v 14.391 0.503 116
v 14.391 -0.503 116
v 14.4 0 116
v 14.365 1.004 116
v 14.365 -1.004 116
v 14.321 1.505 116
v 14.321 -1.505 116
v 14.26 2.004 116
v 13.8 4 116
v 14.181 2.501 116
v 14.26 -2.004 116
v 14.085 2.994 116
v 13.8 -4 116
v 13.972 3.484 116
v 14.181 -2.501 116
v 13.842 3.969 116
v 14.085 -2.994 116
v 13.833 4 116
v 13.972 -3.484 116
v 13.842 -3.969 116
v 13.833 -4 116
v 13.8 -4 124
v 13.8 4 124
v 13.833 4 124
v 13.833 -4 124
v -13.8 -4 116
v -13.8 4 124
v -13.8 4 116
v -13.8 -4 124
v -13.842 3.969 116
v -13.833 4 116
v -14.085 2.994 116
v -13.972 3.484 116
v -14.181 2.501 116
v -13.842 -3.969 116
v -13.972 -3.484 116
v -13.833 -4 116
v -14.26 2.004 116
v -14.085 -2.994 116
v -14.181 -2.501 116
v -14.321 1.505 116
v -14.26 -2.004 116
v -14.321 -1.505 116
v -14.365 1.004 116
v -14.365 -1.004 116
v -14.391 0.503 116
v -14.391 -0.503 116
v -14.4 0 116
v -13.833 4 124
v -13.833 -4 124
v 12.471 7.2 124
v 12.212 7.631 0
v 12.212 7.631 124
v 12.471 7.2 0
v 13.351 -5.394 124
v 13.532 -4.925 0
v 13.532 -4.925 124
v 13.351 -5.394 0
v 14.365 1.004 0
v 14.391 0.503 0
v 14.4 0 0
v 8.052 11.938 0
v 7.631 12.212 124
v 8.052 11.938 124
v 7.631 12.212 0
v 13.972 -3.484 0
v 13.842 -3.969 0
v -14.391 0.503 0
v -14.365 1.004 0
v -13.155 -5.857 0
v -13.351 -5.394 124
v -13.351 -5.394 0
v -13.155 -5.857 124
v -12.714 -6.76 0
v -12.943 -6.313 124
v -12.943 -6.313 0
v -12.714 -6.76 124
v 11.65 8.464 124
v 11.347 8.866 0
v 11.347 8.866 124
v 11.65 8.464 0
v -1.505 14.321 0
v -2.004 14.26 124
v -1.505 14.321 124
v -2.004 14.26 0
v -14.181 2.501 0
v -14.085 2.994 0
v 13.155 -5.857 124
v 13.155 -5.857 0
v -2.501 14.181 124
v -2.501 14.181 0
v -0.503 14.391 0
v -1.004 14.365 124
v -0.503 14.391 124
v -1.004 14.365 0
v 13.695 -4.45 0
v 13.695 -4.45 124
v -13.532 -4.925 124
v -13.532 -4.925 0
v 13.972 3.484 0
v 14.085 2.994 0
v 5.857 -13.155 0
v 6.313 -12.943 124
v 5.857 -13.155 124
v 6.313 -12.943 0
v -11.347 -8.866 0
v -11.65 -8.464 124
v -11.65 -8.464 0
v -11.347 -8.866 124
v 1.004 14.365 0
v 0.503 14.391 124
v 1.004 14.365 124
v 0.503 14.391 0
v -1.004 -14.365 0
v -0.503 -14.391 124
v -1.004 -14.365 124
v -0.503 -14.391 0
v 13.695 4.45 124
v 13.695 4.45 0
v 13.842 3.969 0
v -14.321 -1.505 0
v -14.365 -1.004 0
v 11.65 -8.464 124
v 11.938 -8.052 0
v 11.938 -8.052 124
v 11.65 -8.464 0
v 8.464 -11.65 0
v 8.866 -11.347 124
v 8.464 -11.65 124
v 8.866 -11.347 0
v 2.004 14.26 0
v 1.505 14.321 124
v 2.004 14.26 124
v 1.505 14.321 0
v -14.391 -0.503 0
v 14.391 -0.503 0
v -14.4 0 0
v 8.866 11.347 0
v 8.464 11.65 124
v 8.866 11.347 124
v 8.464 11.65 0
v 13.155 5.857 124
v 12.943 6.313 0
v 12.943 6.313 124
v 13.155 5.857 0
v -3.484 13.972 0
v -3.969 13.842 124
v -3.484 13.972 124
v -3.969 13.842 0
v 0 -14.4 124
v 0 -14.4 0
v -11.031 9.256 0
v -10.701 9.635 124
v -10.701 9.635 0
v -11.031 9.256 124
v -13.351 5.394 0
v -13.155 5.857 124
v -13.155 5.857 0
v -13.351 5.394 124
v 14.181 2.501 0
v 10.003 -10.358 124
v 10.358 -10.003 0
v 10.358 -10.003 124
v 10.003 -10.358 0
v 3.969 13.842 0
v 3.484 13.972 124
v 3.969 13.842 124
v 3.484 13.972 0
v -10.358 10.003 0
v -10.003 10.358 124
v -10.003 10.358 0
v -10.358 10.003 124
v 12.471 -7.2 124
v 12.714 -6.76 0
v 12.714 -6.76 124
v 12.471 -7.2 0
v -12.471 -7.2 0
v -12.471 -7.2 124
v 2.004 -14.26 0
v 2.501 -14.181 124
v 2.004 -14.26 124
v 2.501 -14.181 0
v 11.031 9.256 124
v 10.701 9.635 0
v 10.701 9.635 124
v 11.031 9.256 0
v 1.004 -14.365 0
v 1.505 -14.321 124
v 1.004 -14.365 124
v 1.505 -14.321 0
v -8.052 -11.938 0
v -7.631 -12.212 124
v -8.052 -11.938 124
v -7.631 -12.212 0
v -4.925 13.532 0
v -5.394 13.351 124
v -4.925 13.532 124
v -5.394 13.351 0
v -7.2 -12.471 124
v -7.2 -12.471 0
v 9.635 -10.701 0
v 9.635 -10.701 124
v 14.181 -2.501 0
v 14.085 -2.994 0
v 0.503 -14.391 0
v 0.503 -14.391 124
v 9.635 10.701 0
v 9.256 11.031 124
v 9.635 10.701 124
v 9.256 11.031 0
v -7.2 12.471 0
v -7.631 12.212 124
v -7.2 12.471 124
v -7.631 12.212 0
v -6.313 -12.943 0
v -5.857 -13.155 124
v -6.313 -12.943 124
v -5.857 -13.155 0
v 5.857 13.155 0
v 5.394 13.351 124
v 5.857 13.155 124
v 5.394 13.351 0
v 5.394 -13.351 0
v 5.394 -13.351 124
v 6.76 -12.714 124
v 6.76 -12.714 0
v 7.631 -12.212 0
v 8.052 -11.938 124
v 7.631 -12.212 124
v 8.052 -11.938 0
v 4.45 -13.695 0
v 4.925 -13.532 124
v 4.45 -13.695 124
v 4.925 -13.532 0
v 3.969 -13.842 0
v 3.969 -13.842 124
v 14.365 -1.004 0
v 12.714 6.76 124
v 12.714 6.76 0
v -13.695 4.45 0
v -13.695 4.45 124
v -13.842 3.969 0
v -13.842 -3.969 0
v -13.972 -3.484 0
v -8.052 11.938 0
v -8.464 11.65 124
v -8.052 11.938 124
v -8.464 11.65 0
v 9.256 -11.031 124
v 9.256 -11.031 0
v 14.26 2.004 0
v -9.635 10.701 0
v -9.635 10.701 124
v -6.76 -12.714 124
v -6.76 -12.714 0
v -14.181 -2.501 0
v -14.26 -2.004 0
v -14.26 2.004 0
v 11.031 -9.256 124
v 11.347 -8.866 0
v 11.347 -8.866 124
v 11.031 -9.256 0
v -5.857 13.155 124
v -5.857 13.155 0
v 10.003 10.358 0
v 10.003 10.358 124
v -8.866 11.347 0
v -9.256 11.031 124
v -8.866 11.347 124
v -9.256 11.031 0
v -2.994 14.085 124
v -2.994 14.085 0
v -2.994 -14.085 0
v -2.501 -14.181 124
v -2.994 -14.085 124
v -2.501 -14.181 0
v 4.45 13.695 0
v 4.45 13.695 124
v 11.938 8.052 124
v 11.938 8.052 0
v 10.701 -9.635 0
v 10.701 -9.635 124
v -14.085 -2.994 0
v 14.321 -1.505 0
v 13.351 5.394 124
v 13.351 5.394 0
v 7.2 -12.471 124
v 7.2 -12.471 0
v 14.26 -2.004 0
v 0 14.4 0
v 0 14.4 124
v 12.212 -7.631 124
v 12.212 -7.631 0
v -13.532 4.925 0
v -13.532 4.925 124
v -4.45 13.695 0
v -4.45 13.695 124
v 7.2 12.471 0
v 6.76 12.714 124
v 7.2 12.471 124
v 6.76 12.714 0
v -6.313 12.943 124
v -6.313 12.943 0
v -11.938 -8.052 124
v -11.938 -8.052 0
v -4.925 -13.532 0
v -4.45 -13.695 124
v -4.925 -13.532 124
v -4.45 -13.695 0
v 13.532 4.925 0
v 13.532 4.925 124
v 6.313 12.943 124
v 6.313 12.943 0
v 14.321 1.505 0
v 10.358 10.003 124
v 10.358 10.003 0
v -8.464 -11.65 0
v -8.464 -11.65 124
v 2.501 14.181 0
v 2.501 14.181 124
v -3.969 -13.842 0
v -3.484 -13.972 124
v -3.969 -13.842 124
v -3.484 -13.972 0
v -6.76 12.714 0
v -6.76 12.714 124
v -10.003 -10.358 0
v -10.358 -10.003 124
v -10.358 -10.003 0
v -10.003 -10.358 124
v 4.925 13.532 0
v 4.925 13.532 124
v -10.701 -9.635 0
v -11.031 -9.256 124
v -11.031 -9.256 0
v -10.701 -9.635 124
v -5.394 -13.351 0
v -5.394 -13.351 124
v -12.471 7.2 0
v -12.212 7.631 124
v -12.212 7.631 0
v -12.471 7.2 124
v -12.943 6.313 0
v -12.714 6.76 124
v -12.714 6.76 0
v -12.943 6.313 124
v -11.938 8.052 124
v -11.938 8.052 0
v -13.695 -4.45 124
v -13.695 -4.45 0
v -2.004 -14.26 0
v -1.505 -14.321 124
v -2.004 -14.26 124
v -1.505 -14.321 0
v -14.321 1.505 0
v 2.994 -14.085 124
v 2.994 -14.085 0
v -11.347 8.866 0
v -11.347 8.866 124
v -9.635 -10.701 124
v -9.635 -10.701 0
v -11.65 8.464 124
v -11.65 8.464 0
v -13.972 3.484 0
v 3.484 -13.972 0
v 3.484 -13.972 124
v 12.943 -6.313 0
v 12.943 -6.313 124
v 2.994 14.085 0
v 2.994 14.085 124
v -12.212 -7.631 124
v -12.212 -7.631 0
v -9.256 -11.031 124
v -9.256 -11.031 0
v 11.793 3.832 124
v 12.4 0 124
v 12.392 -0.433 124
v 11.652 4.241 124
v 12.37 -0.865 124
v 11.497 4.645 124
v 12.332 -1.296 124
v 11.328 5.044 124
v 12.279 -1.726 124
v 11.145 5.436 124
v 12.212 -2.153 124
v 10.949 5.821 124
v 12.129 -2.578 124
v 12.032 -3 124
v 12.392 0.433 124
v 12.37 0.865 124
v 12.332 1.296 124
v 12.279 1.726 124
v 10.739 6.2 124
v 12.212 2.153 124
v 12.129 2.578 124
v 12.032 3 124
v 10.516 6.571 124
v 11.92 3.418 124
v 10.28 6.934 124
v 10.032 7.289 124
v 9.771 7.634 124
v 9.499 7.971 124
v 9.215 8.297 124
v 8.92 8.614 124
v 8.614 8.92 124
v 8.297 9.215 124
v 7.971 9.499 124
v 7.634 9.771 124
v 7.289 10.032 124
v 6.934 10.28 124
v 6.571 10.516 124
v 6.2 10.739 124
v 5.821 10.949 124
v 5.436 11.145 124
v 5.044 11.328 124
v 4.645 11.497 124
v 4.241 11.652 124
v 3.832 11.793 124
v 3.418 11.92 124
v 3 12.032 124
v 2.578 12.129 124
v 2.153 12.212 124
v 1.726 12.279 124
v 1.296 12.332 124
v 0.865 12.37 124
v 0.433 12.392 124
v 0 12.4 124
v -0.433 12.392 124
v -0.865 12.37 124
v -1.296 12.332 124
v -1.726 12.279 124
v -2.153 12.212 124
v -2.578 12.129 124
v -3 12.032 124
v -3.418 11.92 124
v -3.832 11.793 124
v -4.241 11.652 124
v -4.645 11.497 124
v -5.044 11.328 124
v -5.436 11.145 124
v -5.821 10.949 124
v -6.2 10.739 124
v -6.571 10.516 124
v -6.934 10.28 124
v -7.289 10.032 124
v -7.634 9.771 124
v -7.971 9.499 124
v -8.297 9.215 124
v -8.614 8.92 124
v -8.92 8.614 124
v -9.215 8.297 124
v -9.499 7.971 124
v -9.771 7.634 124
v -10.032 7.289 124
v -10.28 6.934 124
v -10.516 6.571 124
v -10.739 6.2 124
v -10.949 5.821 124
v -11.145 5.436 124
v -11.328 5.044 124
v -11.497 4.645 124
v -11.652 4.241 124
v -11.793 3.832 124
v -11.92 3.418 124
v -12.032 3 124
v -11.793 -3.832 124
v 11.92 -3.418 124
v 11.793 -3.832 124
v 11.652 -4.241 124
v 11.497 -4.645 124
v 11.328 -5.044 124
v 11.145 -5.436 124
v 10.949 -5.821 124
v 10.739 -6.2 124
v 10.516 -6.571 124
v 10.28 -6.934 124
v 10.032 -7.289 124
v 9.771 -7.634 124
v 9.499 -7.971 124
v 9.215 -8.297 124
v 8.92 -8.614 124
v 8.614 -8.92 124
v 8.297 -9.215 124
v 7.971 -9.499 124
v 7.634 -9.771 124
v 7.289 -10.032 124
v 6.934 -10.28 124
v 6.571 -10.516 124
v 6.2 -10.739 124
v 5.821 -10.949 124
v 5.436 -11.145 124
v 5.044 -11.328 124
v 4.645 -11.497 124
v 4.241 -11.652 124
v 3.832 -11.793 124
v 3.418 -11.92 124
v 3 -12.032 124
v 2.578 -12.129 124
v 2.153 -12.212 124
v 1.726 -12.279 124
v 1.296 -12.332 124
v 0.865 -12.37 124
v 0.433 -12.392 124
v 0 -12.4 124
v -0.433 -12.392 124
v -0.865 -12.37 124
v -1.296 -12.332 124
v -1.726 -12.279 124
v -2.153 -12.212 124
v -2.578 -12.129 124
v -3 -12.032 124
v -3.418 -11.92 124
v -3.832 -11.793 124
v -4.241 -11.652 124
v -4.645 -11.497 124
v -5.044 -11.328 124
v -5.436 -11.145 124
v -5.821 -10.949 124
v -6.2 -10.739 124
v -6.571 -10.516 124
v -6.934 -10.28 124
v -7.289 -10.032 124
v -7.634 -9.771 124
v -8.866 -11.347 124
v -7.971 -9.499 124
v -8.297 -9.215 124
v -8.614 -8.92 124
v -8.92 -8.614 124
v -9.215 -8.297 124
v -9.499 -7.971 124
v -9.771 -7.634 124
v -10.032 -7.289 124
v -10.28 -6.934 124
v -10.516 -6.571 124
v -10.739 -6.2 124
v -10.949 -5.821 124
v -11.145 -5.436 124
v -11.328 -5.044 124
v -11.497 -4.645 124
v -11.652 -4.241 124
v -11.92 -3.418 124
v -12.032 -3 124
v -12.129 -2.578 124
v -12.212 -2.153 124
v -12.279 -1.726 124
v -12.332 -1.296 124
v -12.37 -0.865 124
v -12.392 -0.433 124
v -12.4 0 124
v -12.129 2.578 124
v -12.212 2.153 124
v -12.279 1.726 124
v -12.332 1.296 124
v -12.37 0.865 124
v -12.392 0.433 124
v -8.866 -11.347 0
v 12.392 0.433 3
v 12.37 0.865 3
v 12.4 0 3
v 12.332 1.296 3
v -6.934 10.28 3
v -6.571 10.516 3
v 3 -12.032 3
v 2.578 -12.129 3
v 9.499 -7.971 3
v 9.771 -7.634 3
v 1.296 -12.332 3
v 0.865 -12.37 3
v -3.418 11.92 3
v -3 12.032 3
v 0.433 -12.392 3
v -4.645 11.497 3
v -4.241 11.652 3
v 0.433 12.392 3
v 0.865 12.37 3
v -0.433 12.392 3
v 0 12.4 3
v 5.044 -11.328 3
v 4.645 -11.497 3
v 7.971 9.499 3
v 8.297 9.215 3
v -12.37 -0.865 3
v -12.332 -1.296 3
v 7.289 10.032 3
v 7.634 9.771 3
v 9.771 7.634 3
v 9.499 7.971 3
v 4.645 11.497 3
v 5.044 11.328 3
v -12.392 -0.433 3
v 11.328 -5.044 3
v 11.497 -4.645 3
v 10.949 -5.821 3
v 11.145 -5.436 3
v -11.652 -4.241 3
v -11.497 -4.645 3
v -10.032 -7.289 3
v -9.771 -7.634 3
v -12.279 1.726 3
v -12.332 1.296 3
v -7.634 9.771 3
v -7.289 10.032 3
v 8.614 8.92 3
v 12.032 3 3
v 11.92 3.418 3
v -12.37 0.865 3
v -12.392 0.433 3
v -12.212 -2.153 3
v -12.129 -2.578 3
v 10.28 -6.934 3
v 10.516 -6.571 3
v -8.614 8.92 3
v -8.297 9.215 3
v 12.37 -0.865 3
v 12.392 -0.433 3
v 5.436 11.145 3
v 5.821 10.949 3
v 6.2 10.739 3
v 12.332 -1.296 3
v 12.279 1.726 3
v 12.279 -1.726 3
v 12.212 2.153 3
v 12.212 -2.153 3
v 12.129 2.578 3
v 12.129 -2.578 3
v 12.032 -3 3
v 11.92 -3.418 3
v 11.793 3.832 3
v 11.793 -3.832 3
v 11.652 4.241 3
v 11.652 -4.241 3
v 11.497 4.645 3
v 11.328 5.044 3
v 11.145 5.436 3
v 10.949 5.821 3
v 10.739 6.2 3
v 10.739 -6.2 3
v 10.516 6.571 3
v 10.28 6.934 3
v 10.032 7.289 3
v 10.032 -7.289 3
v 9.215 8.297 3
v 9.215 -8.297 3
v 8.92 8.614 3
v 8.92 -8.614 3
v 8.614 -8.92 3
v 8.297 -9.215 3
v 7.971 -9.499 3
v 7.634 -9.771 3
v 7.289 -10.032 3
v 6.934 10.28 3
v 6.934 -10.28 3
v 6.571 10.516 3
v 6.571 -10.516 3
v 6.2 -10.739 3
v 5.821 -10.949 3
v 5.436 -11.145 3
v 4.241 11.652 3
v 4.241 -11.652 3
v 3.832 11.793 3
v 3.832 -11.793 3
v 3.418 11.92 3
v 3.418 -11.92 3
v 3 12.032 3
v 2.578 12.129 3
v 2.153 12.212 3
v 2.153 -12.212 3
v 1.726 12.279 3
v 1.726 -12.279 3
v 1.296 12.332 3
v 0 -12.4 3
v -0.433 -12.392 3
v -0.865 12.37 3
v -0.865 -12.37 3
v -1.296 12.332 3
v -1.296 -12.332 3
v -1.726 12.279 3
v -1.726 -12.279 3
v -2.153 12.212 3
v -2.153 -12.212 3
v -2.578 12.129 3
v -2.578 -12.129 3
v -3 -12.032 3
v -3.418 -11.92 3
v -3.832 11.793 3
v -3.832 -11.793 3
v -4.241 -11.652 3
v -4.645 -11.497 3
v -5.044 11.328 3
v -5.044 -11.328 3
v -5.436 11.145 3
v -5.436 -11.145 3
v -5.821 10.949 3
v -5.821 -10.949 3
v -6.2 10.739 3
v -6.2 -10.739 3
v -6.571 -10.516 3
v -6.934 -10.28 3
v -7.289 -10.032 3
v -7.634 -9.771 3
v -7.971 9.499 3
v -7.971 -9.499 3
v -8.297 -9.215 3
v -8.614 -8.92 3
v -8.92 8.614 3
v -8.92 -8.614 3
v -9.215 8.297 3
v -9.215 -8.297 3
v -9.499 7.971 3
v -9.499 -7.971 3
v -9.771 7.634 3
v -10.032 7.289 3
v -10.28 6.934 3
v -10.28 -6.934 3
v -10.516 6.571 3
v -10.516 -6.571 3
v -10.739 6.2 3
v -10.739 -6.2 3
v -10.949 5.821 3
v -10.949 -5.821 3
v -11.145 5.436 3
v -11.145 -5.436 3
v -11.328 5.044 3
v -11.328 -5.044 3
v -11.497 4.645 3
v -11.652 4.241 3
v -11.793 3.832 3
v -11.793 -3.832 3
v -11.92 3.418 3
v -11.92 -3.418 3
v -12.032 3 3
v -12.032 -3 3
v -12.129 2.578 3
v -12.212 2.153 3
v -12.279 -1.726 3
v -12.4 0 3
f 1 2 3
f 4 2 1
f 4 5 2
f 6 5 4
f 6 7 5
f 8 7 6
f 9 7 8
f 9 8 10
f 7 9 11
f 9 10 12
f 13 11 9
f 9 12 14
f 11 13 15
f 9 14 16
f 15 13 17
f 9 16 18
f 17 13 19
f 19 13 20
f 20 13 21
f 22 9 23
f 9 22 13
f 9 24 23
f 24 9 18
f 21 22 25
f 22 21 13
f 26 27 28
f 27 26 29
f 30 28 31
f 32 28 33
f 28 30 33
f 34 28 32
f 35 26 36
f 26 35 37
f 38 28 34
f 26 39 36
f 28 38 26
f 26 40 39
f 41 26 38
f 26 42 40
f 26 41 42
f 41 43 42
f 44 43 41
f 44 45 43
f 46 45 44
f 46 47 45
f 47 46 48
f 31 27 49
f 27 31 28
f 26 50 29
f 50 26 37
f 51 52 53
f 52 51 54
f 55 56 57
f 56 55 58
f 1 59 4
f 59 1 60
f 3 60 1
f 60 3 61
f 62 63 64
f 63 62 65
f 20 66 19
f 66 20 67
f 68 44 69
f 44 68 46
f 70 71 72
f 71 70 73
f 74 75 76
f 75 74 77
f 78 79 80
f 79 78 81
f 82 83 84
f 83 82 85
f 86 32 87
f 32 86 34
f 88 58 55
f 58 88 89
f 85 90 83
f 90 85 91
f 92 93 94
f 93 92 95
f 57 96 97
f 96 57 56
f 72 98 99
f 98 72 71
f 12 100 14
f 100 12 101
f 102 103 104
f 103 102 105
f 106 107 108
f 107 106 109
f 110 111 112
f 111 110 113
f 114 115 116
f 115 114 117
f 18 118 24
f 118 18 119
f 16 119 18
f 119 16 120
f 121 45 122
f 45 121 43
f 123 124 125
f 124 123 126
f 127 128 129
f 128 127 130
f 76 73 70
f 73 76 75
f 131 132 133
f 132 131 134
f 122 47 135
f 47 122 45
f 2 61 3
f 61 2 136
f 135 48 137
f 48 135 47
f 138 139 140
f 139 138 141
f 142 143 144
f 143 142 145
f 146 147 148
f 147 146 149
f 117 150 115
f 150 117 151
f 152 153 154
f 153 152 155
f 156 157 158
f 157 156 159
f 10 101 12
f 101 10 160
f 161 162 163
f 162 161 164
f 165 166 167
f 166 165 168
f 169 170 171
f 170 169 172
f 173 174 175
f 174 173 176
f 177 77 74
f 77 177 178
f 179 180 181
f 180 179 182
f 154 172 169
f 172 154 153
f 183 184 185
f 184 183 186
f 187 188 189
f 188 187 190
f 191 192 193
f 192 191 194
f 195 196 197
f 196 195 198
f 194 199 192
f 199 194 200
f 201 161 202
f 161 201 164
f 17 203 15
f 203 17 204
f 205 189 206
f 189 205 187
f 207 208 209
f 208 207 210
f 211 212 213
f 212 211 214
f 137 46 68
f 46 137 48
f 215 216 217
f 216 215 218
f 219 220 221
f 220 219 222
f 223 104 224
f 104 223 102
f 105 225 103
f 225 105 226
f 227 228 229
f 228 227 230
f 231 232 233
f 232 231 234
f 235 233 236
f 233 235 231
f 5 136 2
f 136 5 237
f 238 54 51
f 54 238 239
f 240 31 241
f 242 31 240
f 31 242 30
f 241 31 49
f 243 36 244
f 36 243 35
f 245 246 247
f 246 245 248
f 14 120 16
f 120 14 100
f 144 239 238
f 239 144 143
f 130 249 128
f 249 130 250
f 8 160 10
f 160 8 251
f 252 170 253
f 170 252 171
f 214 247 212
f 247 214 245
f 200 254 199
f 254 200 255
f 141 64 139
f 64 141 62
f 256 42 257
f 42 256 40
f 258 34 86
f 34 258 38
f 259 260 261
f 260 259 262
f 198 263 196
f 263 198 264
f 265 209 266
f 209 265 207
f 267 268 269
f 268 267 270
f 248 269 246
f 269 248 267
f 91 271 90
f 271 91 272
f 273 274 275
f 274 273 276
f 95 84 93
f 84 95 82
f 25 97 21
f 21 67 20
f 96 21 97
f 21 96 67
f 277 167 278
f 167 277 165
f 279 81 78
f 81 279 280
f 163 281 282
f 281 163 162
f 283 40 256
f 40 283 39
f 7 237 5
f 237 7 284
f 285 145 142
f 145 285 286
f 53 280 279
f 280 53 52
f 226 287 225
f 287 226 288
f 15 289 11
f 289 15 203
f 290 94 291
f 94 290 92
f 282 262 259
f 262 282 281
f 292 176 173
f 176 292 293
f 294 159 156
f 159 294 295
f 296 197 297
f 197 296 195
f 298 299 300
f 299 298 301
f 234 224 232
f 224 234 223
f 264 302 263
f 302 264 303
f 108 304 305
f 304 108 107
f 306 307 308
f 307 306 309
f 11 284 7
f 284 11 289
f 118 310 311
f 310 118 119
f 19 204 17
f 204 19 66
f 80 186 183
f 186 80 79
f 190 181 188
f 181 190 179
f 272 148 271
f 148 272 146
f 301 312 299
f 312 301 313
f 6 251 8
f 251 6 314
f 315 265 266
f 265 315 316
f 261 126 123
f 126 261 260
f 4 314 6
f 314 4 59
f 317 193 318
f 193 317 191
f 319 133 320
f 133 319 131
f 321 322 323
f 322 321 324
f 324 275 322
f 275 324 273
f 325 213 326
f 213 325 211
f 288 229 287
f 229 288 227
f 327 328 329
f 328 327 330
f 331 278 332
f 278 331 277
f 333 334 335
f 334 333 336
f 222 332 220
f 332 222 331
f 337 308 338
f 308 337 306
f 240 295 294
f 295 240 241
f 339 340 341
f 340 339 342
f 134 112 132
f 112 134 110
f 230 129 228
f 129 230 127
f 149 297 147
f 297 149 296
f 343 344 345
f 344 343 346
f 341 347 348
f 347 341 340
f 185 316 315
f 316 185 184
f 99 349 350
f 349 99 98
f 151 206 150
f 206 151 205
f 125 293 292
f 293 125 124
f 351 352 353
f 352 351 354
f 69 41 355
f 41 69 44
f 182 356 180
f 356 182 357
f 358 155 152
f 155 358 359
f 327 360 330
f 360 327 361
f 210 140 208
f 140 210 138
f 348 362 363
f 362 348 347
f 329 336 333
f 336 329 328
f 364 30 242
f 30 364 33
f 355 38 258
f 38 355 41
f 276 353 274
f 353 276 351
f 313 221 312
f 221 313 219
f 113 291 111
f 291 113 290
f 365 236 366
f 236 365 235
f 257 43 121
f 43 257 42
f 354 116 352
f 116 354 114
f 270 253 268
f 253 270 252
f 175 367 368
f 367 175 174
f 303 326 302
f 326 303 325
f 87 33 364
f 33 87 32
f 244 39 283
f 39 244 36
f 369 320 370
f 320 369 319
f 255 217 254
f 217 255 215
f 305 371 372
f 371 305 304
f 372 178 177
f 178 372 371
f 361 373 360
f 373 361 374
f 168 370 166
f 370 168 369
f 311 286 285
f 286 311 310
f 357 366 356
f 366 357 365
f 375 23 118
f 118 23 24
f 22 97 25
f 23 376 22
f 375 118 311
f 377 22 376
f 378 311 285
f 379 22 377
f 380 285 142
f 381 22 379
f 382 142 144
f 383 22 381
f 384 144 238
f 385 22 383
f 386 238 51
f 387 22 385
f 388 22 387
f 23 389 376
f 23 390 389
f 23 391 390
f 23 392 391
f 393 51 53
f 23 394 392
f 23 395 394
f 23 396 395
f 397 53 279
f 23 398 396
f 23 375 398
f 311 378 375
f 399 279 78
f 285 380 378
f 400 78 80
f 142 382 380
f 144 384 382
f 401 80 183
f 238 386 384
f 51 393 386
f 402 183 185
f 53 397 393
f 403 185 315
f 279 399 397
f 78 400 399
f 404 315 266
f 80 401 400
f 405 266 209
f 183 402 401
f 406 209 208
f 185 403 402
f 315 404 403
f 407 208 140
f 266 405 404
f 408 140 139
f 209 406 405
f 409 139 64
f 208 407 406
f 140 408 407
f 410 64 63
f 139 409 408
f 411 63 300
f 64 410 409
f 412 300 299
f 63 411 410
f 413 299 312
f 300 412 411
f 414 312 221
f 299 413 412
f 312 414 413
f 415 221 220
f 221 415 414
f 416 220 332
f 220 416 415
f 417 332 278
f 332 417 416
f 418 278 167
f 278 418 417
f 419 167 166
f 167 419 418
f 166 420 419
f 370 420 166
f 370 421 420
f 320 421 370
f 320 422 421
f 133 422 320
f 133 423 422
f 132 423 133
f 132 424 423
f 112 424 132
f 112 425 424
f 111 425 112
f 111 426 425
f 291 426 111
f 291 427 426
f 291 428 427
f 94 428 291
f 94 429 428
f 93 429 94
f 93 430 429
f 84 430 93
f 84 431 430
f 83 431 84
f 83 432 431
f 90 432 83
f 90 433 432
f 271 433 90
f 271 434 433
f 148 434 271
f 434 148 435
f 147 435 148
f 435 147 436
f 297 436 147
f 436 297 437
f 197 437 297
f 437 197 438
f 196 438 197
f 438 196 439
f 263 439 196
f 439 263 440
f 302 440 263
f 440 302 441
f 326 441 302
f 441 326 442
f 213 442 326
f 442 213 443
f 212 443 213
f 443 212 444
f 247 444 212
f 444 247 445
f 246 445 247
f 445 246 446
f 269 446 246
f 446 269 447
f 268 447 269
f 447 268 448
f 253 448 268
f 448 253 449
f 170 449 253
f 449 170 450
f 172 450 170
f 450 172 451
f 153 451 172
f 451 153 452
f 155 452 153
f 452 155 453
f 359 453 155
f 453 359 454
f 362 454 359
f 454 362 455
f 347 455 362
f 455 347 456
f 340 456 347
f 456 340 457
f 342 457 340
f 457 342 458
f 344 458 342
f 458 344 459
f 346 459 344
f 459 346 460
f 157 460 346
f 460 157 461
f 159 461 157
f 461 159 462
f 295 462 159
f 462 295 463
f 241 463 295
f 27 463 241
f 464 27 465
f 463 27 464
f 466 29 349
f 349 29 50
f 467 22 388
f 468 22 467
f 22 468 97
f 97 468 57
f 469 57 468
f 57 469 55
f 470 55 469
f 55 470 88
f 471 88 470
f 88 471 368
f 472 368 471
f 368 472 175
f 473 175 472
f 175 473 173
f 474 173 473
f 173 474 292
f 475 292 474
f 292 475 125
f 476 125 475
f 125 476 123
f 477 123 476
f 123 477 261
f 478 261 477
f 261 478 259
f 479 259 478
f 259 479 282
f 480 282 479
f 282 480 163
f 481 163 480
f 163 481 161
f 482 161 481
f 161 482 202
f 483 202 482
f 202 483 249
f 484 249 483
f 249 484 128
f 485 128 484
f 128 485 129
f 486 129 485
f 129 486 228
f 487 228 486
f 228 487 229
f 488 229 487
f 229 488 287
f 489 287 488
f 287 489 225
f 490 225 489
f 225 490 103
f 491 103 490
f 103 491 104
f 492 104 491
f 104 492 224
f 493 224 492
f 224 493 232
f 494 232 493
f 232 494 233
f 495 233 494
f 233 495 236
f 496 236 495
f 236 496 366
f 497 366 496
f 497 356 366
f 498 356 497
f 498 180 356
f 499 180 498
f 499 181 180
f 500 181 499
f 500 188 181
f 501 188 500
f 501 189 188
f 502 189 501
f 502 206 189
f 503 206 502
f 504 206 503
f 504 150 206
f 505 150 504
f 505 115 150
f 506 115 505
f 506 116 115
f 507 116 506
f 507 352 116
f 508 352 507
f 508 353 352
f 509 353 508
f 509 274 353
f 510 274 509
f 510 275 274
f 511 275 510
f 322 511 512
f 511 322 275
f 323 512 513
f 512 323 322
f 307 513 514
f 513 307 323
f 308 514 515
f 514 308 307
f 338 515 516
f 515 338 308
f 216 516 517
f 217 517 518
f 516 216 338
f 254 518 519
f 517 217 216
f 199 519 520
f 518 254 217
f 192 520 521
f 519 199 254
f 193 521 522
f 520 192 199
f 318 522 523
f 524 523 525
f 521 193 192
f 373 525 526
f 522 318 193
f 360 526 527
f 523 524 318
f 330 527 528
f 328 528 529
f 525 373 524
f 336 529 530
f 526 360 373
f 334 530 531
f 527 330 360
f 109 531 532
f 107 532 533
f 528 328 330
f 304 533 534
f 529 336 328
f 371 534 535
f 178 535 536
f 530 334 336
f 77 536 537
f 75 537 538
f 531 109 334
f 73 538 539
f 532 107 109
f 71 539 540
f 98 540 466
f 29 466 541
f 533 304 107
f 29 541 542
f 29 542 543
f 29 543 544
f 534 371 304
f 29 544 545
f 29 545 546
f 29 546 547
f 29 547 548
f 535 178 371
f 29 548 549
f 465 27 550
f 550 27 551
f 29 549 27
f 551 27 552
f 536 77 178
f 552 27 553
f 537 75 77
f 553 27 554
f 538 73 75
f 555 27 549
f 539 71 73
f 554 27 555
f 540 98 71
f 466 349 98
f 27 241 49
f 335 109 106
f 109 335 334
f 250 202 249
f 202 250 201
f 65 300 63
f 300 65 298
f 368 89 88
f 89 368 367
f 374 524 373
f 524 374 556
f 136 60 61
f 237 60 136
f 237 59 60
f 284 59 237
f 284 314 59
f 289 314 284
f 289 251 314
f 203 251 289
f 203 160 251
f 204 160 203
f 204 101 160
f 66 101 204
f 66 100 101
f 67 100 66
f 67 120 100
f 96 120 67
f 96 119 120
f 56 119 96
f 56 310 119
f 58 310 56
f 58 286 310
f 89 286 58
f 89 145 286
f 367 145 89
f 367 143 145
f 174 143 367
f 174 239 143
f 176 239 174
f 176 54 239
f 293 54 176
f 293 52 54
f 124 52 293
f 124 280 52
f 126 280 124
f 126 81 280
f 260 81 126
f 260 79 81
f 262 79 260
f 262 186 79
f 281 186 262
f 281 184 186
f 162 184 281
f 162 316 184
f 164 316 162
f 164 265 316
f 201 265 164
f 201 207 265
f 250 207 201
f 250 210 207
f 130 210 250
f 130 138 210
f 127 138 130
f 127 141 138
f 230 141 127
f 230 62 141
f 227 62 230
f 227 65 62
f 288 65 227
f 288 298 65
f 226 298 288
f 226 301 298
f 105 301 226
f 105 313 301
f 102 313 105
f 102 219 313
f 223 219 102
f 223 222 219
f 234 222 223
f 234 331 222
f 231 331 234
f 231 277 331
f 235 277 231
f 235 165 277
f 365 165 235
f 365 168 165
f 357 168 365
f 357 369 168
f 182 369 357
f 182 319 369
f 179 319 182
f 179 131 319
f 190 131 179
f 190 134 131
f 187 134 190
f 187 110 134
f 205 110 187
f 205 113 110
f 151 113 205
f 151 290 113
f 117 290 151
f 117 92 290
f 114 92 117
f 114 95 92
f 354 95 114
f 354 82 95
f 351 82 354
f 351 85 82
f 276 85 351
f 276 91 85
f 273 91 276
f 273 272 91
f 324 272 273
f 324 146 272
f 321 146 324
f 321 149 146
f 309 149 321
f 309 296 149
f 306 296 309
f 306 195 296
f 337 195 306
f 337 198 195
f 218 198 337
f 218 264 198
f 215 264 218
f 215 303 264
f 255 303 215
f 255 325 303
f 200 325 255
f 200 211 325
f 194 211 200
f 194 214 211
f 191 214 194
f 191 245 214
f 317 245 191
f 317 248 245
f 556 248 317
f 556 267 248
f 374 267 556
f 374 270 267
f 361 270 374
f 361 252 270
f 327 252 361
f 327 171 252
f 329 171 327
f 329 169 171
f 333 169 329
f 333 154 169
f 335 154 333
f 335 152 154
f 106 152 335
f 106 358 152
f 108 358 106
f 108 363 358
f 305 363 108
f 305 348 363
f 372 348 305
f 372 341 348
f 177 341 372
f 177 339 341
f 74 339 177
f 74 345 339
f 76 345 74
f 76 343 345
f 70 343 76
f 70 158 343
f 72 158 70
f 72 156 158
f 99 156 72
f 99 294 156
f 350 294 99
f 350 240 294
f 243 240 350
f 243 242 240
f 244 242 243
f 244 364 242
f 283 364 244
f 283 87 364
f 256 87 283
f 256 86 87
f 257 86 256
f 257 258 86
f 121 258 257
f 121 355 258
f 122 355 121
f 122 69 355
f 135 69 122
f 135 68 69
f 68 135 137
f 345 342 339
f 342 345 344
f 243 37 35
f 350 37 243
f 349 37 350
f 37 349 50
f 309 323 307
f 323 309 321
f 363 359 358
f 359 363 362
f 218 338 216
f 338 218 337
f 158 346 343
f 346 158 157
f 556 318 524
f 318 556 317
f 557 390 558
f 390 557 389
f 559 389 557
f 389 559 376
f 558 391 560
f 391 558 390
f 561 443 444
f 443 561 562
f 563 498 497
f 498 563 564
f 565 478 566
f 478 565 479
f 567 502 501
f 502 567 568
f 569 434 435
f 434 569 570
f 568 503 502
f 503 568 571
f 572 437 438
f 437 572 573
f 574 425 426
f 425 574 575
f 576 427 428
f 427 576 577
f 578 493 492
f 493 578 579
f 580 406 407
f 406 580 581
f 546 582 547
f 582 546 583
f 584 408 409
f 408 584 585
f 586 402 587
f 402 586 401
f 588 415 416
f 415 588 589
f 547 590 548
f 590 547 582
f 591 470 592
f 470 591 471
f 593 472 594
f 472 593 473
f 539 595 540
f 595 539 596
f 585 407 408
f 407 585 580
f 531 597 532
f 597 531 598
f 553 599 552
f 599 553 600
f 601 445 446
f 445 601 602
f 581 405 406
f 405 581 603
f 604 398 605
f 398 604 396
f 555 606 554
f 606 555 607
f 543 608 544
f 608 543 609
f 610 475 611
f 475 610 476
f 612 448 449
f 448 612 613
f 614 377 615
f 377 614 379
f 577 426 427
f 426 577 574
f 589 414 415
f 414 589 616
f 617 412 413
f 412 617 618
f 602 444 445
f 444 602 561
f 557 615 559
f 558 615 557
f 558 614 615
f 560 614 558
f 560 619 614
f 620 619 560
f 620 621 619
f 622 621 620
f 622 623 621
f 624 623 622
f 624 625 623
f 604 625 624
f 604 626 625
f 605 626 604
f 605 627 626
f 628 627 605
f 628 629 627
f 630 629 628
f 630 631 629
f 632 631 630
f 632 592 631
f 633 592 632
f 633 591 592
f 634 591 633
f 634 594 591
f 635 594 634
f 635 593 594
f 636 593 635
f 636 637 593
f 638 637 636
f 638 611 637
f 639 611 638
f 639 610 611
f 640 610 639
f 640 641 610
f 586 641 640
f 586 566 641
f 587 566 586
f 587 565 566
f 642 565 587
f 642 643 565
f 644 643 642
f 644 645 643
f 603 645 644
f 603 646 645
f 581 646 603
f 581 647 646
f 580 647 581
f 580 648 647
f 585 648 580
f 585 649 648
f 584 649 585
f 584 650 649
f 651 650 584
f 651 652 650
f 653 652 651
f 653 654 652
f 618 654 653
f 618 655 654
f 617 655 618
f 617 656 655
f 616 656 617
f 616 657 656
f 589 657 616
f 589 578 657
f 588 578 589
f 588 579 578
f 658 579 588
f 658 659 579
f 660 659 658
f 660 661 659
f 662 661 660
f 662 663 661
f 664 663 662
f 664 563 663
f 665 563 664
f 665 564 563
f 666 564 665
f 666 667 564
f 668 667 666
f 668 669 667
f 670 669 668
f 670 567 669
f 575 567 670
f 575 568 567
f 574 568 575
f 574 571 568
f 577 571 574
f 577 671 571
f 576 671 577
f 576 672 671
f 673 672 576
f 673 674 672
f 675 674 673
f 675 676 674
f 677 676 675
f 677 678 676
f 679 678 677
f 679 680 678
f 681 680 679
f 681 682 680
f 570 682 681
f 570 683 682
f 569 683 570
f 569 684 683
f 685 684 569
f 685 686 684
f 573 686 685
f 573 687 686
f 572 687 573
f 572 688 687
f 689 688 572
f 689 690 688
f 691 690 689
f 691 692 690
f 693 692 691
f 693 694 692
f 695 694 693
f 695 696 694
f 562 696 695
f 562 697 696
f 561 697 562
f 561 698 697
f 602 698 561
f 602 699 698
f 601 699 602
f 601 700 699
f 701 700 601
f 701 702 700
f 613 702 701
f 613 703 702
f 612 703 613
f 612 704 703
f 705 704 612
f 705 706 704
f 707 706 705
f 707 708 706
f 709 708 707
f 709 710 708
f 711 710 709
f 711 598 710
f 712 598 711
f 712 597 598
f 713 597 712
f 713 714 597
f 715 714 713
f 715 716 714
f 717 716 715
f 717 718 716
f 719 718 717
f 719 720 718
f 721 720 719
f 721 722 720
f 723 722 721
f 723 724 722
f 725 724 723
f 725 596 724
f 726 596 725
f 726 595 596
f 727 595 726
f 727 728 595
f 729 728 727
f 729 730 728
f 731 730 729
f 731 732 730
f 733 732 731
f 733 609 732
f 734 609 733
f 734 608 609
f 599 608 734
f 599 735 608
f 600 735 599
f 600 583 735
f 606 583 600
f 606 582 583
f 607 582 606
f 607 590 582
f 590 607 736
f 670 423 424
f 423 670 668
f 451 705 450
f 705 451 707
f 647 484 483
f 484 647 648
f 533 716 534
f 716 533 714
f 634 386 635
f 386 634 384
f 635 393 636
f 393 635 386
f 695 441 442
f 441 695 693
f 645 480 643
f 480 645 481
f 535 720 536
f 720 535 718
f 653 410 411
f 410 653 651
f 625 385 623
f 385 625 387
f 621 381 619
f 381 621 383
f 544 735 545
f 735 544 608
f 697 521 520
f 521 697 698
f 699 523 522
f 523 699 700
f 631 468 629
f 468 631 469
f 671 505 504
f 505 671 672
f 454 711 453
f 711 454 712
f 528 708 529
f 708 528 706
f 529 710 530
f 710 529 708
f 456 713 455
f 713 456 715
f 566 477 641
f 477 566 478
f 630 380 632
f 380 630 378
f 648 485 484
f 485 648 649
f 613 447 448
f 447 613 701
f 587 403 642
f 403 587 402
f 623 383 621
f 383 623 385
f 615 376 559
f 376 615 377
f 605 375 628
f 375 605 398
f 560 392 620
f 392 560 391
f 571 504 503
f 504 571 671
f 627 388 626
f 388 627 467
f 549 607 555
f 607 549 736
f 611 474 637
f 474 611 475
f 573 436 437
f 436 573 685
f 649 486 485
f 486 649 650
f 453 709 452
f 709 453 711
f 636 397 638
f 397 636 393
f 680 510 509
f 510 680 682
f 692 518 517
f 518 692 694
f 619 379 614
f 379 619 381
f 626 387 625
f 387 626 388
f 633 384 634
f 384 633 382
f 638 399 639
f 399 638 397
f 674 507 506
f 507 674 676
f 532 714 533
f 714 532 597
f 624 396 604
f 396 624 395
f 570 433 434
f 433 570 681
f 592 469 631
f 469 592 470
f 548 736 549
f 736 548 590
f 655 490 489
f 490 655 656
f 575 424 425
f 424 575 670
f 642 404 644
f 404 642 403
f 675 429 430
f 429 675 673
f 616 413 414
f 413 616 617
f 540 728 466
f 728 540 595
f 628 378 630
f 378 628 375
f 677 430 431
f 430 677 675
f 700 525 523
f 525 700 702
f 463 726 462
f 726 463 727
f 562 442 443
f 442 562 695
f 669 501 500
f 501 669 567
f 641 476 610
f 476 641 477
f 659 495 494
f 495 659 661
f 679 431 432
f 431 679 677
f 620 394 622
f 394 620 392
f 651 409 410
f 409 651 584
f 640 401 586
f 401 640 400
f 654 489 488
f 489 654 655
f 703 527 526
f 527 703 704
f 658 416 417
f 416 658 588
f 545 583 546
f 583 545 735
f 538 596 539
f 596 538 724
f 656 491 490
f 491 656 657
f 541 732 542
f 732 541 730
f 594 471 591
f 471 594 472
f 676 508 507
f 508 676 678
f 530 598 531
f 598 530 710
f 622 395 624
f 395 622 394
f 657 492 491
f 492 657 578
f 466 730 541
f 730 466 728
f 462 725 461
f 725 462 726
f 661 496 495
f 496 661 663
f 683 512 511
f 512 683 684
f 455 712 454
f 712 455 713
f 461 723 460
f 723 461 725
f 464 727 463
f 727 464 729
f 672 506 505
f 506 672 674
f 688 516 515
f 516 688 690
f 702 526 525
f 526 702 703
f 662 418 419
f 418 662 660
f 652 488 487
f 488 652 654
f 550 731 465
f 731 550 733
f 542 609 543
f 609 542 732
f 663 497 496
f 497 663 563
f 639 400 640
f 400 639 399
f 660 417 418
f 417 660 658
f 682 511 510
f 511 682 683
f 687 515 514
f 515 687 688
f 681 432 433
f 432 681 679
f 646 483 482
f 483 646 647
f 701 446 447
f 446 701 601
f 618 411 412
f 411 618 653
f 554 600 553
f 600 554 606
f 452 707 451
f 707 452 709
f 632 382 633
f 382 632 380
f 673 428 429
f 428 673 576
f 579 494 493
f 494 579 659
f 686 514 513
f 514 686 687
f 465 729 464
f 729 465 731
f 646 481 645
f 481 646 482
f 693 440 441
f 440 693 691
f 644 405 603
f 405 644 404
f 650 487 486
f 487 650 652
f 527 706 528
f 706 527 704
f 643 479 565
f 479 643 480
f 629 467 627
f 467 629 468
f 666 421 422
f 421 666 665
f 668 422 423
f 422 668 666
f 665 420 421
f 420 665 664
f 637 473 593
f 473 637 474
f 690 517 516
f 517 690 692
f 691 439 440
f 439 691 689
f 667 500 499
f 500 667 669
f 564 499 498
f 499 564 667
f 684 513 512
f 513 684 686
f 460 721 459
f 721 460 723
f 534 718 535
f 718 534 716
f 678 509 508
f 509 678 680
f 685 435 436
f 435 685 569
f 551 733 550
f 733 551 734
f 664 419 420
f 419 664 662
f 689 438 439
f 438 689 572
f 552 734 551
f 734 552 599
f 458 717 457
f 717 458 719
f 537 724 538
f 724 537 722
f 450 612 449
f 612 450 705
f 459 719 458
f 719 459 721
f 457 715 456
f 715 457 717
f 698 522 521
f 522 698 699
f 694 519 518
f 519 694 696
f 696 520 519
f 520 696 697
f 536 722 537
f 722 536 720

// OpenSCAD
// ***********************************
// Project: 3D Printed Rocket
// Filename: MotorDummy29.scad
// Mass-equivalent inert motors, 29mm
// by Tõnu Samuel
// Created: 2026-08-13
// Units: mm
// ***********************************
//  ***** Notes *****
//
// Inert stand-ins matching a real motor's envelope AND its mass, so the
// recovery system can be exercised on the ground with the rocket loaded
// the way it actually flies.
//
// Why mass-equivalent and not just a plug: a 128g motor sits 480mm aft of
// the nose and is the single largest mass in the airframe. Swing-testing
// or drop-testing without it measures a different rocket. Ejection and
// separation tests done with an empty motor tube let the aft section move
// far too easily.
//
// The shell is printed light and the mass is made up with loose ballast in
// the cavity, so ONE print covers both the loaded and burnout cases: fill
// to the loaded figure, test, then pour some out to the burnout figure and
// test again. That second case matters - burnout is when the deployment
// actually happens.
//
// Echoes tell you the exact ballast mass to add. Weigh the printed shell
// first; the echo assumes the density below and your printer will differ.
//
// CG: the real motor's CG is not published, and a uniformly-filled dummy
// puts it at mid-length. Good enough for separation and fit testing; if
// you need CG fidelity for a swing test, bias the ballast aft and say so
// in your notes rather than trusting this part.
//
//  ***** History *****
//
function MotorDummy29_Rev()="MotorDummy29 0.1.0";
echo(MotorDummy29_Rev());
// 0.1.0  2026-08-13  First code.

Overlap = 0.05;
IDXtra  = 0.2;
$fn = $preview ? 36 : 180;

// ============================================
// MOTOR SELECTION
// ============================================
// 0 = AeroTech G80T-14A   29 x 124mm, 128g loaded, 63g propellant
// 1 = AeroTech H182R-14A  29 x 203mm, 207g loaded, 115g propellant
// 2 = AeroTech H135W-14A  29 x 216mm, 212g loaded,  82g propellant
// Figures from thrustcurve.org.
Motor_Class = 0;

// [OD, length, loaded mass g, propellant mass g]
Motor_Data = [[29, 124, 128, 63],
              [29, 203, 207, 115],
              [29, 216, 212,  82]];

Filament_Density = 1.27;   // g/cm3. PETG. PC is 1.20, PLA 1.24.

// ============================================
// DERIVED
// ============================================
M_OD   = Motor_Data[Motor_Class][0];
M_L    = Motor_Data[Motor_Class][1];
M_Wet  = Motor_Data[Motor_Class][2];
M_Prop = Motor_Data[Motor_Class][3];
M_Dry  = M_Wet - M_Prop;

Wall     = 2.0;
End_T    = 3.0;
Body_OD  = M_OD - IDXtra;         // slip fit in a 29mm motor tube
Cavity_d = Body_OD - 2*Wall;
// Closed at the FORWARD end only (3rd review, defect 10 -- was labelled
// "AFT" here and printed/loaded accordingly, which put the ballast port
// and the grip flats below at the BURIED end instead of the reachable
// one; see the module comment below for the full reasoning). Sealing
// both ends makes an enclosed void: the ballast cannot go in, and the
// render reports genus -1 (two surface components) rather than 1 -
// which is how the first version was caught.
Cavity_L = M_L - End_T;

// Solid shell volume in mm3, then cm3.
Shell_mm3 = PI*pow(Body_OD/2,2)*M_L - PI*pow(Cavity_d/2,2)*Cavity_L;
Shell_cm3 = Shell_mm3/1000;
Shell_g   = Shell_cm3 * Filament_Density;
Cavity_cm3 = PI*pow(Cavity_d/2,2)*Cavity_L/1000;

echo(str("motor            : class ", Motor_Class, "  ", M_OD, " x ", M_L, "mm"));
echo(str("shell (100% fill): ", Shell_cm3, " cm3 = ", Shell_g, " g"));
echo(str("cavity           : ", Cavity_cm3, " cm3"));
echo(str("BALLAST, loaded  : ", M_Wet - Shell_g, " g   (total ", M_Wet, " g)"));
echo(str("BALLAST, burnout : ", M_Dry - Shell_g, " g   (total ", M_Dry, " g)"));
echo(str("ballast density needed, loaded: ",
         (M_Wet - Shell_g)/Cavity_cm3, " g/cm3"));
// Sand ~1.5, steel shot ~4.5, lead shot ~6.5 g/cm3 loose-packed. If the
// figure above exceeds ~4 the cavity is too small for anything but lead.

// ============================================
// PART
// ============================================
// Prints forward-end down, no supports: the cavity is a plain bore and
// the open aft end needs no bridging. Tape or a printed plug retains the
// ballast - deliberately not a screw thread, so you can change the fill
// between the loaded and burnout tests without tools.
//
// Grip flats and fill opening are at the AFT end (3rd review, defect
// 10 -- the pre-fix part had both at the open end, which this file
// mislabelled "forward"). A real motor loads forward-closure-first:
// that closed end leads the insertion and ends up
// buried against the thrust ring, ~104mm+ deep for the G80T; the
// nozzle end trails and stays at the tube's aft opening, reachable,
// where the retainer clips on. A mass-equivalent dummy has to load the
// same way for the ground test to mean anything, so its own closed end
// (below, z=0) is the FORWARD end -- correctly buried and inert -- and
// its open end (grip flats + ballast port, z=M_L) is the AFT end,
// staying at the tube's mouth where you can actually reach it to pull
// the dummy back out or change the ballast. The pre-fix version called
// the closed end "aft" and the open end "forward", which is backwards:
// following those labels at insertion buries the ballast port and grip
// flats 104mm+ into the tube, unreachable once loaded.
module MotorDummy(){
    difference(){
        cylinder(d=Body_OD, h=M_L);
        translate([0,0,End_T])
            cylinder(d=Cavity_d, h=Cavity_L + Overlap);   // opens at the top (aft)
        // Grip flats so it can be pulled back out of the motor tube.
        for (a=[0,180])
            rotate([0,0,a]) translate([Body_OD/2-0.6, -4, M_L-8])
                cube([2, 8, 8+Overlap]);
    }
} // MotorDummy

MotorDummy();
